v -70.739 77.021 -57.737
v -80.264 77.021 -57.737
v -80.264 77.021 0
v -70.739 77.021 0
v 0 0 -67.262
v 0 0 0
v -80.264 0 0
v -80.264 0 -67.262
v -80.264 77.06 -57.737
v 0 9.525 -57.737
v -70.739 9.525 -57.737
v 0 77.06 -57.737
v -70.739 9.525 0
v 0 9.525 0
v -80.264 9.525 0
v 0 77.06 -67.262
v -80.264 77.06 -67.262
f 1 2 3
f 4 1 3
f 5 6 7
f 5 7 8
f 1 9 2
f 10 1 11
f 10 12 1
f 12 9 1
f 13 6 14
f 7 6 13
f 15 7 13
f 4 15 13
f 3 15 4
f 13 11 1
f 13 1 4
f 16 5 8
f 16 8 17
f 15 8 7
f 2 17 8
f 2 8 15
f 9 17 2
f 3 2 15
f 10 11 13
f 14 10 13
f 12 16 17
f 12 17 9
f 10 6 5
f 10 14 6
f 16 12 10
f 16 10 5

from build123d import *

# Parameters (mm, degrees)
EXTRUDE1_DEPTH = 80.264
SKETCH2_W      = 57.737446173
SKETCH2_H      = 67.495663922
EXTRUDE2_DEPTH = 9.525


with BuildPart() as part:
    # Sketch1 → Extrude1 (new body)
    with BuildSketch(Plane(origin=(0, 0, 0), x_dir=(0, 0, -1), z_dir=(1, 0, 0))):
        Polygon((0, 0), (67.262446173, 0), (67.262446173, 77.060221675), (57.737446173, 77.060221675), (57.737446173, 9.525), (0, 9.525), align=None)
    extrude(amount=-EXTRUDE1_DEPTH)

    # Sketch2 → Extrude2 (add)
    with BuildSketch(Plane.ZY.offset(80.264)):
        with Locations((-28.868723087, 43.272831961)):
            Rectangle(SKETCH2_W, SKETCH2_H)
    extrude(amount=-EXTRUDE2_DEPTH)


solid = part.part
